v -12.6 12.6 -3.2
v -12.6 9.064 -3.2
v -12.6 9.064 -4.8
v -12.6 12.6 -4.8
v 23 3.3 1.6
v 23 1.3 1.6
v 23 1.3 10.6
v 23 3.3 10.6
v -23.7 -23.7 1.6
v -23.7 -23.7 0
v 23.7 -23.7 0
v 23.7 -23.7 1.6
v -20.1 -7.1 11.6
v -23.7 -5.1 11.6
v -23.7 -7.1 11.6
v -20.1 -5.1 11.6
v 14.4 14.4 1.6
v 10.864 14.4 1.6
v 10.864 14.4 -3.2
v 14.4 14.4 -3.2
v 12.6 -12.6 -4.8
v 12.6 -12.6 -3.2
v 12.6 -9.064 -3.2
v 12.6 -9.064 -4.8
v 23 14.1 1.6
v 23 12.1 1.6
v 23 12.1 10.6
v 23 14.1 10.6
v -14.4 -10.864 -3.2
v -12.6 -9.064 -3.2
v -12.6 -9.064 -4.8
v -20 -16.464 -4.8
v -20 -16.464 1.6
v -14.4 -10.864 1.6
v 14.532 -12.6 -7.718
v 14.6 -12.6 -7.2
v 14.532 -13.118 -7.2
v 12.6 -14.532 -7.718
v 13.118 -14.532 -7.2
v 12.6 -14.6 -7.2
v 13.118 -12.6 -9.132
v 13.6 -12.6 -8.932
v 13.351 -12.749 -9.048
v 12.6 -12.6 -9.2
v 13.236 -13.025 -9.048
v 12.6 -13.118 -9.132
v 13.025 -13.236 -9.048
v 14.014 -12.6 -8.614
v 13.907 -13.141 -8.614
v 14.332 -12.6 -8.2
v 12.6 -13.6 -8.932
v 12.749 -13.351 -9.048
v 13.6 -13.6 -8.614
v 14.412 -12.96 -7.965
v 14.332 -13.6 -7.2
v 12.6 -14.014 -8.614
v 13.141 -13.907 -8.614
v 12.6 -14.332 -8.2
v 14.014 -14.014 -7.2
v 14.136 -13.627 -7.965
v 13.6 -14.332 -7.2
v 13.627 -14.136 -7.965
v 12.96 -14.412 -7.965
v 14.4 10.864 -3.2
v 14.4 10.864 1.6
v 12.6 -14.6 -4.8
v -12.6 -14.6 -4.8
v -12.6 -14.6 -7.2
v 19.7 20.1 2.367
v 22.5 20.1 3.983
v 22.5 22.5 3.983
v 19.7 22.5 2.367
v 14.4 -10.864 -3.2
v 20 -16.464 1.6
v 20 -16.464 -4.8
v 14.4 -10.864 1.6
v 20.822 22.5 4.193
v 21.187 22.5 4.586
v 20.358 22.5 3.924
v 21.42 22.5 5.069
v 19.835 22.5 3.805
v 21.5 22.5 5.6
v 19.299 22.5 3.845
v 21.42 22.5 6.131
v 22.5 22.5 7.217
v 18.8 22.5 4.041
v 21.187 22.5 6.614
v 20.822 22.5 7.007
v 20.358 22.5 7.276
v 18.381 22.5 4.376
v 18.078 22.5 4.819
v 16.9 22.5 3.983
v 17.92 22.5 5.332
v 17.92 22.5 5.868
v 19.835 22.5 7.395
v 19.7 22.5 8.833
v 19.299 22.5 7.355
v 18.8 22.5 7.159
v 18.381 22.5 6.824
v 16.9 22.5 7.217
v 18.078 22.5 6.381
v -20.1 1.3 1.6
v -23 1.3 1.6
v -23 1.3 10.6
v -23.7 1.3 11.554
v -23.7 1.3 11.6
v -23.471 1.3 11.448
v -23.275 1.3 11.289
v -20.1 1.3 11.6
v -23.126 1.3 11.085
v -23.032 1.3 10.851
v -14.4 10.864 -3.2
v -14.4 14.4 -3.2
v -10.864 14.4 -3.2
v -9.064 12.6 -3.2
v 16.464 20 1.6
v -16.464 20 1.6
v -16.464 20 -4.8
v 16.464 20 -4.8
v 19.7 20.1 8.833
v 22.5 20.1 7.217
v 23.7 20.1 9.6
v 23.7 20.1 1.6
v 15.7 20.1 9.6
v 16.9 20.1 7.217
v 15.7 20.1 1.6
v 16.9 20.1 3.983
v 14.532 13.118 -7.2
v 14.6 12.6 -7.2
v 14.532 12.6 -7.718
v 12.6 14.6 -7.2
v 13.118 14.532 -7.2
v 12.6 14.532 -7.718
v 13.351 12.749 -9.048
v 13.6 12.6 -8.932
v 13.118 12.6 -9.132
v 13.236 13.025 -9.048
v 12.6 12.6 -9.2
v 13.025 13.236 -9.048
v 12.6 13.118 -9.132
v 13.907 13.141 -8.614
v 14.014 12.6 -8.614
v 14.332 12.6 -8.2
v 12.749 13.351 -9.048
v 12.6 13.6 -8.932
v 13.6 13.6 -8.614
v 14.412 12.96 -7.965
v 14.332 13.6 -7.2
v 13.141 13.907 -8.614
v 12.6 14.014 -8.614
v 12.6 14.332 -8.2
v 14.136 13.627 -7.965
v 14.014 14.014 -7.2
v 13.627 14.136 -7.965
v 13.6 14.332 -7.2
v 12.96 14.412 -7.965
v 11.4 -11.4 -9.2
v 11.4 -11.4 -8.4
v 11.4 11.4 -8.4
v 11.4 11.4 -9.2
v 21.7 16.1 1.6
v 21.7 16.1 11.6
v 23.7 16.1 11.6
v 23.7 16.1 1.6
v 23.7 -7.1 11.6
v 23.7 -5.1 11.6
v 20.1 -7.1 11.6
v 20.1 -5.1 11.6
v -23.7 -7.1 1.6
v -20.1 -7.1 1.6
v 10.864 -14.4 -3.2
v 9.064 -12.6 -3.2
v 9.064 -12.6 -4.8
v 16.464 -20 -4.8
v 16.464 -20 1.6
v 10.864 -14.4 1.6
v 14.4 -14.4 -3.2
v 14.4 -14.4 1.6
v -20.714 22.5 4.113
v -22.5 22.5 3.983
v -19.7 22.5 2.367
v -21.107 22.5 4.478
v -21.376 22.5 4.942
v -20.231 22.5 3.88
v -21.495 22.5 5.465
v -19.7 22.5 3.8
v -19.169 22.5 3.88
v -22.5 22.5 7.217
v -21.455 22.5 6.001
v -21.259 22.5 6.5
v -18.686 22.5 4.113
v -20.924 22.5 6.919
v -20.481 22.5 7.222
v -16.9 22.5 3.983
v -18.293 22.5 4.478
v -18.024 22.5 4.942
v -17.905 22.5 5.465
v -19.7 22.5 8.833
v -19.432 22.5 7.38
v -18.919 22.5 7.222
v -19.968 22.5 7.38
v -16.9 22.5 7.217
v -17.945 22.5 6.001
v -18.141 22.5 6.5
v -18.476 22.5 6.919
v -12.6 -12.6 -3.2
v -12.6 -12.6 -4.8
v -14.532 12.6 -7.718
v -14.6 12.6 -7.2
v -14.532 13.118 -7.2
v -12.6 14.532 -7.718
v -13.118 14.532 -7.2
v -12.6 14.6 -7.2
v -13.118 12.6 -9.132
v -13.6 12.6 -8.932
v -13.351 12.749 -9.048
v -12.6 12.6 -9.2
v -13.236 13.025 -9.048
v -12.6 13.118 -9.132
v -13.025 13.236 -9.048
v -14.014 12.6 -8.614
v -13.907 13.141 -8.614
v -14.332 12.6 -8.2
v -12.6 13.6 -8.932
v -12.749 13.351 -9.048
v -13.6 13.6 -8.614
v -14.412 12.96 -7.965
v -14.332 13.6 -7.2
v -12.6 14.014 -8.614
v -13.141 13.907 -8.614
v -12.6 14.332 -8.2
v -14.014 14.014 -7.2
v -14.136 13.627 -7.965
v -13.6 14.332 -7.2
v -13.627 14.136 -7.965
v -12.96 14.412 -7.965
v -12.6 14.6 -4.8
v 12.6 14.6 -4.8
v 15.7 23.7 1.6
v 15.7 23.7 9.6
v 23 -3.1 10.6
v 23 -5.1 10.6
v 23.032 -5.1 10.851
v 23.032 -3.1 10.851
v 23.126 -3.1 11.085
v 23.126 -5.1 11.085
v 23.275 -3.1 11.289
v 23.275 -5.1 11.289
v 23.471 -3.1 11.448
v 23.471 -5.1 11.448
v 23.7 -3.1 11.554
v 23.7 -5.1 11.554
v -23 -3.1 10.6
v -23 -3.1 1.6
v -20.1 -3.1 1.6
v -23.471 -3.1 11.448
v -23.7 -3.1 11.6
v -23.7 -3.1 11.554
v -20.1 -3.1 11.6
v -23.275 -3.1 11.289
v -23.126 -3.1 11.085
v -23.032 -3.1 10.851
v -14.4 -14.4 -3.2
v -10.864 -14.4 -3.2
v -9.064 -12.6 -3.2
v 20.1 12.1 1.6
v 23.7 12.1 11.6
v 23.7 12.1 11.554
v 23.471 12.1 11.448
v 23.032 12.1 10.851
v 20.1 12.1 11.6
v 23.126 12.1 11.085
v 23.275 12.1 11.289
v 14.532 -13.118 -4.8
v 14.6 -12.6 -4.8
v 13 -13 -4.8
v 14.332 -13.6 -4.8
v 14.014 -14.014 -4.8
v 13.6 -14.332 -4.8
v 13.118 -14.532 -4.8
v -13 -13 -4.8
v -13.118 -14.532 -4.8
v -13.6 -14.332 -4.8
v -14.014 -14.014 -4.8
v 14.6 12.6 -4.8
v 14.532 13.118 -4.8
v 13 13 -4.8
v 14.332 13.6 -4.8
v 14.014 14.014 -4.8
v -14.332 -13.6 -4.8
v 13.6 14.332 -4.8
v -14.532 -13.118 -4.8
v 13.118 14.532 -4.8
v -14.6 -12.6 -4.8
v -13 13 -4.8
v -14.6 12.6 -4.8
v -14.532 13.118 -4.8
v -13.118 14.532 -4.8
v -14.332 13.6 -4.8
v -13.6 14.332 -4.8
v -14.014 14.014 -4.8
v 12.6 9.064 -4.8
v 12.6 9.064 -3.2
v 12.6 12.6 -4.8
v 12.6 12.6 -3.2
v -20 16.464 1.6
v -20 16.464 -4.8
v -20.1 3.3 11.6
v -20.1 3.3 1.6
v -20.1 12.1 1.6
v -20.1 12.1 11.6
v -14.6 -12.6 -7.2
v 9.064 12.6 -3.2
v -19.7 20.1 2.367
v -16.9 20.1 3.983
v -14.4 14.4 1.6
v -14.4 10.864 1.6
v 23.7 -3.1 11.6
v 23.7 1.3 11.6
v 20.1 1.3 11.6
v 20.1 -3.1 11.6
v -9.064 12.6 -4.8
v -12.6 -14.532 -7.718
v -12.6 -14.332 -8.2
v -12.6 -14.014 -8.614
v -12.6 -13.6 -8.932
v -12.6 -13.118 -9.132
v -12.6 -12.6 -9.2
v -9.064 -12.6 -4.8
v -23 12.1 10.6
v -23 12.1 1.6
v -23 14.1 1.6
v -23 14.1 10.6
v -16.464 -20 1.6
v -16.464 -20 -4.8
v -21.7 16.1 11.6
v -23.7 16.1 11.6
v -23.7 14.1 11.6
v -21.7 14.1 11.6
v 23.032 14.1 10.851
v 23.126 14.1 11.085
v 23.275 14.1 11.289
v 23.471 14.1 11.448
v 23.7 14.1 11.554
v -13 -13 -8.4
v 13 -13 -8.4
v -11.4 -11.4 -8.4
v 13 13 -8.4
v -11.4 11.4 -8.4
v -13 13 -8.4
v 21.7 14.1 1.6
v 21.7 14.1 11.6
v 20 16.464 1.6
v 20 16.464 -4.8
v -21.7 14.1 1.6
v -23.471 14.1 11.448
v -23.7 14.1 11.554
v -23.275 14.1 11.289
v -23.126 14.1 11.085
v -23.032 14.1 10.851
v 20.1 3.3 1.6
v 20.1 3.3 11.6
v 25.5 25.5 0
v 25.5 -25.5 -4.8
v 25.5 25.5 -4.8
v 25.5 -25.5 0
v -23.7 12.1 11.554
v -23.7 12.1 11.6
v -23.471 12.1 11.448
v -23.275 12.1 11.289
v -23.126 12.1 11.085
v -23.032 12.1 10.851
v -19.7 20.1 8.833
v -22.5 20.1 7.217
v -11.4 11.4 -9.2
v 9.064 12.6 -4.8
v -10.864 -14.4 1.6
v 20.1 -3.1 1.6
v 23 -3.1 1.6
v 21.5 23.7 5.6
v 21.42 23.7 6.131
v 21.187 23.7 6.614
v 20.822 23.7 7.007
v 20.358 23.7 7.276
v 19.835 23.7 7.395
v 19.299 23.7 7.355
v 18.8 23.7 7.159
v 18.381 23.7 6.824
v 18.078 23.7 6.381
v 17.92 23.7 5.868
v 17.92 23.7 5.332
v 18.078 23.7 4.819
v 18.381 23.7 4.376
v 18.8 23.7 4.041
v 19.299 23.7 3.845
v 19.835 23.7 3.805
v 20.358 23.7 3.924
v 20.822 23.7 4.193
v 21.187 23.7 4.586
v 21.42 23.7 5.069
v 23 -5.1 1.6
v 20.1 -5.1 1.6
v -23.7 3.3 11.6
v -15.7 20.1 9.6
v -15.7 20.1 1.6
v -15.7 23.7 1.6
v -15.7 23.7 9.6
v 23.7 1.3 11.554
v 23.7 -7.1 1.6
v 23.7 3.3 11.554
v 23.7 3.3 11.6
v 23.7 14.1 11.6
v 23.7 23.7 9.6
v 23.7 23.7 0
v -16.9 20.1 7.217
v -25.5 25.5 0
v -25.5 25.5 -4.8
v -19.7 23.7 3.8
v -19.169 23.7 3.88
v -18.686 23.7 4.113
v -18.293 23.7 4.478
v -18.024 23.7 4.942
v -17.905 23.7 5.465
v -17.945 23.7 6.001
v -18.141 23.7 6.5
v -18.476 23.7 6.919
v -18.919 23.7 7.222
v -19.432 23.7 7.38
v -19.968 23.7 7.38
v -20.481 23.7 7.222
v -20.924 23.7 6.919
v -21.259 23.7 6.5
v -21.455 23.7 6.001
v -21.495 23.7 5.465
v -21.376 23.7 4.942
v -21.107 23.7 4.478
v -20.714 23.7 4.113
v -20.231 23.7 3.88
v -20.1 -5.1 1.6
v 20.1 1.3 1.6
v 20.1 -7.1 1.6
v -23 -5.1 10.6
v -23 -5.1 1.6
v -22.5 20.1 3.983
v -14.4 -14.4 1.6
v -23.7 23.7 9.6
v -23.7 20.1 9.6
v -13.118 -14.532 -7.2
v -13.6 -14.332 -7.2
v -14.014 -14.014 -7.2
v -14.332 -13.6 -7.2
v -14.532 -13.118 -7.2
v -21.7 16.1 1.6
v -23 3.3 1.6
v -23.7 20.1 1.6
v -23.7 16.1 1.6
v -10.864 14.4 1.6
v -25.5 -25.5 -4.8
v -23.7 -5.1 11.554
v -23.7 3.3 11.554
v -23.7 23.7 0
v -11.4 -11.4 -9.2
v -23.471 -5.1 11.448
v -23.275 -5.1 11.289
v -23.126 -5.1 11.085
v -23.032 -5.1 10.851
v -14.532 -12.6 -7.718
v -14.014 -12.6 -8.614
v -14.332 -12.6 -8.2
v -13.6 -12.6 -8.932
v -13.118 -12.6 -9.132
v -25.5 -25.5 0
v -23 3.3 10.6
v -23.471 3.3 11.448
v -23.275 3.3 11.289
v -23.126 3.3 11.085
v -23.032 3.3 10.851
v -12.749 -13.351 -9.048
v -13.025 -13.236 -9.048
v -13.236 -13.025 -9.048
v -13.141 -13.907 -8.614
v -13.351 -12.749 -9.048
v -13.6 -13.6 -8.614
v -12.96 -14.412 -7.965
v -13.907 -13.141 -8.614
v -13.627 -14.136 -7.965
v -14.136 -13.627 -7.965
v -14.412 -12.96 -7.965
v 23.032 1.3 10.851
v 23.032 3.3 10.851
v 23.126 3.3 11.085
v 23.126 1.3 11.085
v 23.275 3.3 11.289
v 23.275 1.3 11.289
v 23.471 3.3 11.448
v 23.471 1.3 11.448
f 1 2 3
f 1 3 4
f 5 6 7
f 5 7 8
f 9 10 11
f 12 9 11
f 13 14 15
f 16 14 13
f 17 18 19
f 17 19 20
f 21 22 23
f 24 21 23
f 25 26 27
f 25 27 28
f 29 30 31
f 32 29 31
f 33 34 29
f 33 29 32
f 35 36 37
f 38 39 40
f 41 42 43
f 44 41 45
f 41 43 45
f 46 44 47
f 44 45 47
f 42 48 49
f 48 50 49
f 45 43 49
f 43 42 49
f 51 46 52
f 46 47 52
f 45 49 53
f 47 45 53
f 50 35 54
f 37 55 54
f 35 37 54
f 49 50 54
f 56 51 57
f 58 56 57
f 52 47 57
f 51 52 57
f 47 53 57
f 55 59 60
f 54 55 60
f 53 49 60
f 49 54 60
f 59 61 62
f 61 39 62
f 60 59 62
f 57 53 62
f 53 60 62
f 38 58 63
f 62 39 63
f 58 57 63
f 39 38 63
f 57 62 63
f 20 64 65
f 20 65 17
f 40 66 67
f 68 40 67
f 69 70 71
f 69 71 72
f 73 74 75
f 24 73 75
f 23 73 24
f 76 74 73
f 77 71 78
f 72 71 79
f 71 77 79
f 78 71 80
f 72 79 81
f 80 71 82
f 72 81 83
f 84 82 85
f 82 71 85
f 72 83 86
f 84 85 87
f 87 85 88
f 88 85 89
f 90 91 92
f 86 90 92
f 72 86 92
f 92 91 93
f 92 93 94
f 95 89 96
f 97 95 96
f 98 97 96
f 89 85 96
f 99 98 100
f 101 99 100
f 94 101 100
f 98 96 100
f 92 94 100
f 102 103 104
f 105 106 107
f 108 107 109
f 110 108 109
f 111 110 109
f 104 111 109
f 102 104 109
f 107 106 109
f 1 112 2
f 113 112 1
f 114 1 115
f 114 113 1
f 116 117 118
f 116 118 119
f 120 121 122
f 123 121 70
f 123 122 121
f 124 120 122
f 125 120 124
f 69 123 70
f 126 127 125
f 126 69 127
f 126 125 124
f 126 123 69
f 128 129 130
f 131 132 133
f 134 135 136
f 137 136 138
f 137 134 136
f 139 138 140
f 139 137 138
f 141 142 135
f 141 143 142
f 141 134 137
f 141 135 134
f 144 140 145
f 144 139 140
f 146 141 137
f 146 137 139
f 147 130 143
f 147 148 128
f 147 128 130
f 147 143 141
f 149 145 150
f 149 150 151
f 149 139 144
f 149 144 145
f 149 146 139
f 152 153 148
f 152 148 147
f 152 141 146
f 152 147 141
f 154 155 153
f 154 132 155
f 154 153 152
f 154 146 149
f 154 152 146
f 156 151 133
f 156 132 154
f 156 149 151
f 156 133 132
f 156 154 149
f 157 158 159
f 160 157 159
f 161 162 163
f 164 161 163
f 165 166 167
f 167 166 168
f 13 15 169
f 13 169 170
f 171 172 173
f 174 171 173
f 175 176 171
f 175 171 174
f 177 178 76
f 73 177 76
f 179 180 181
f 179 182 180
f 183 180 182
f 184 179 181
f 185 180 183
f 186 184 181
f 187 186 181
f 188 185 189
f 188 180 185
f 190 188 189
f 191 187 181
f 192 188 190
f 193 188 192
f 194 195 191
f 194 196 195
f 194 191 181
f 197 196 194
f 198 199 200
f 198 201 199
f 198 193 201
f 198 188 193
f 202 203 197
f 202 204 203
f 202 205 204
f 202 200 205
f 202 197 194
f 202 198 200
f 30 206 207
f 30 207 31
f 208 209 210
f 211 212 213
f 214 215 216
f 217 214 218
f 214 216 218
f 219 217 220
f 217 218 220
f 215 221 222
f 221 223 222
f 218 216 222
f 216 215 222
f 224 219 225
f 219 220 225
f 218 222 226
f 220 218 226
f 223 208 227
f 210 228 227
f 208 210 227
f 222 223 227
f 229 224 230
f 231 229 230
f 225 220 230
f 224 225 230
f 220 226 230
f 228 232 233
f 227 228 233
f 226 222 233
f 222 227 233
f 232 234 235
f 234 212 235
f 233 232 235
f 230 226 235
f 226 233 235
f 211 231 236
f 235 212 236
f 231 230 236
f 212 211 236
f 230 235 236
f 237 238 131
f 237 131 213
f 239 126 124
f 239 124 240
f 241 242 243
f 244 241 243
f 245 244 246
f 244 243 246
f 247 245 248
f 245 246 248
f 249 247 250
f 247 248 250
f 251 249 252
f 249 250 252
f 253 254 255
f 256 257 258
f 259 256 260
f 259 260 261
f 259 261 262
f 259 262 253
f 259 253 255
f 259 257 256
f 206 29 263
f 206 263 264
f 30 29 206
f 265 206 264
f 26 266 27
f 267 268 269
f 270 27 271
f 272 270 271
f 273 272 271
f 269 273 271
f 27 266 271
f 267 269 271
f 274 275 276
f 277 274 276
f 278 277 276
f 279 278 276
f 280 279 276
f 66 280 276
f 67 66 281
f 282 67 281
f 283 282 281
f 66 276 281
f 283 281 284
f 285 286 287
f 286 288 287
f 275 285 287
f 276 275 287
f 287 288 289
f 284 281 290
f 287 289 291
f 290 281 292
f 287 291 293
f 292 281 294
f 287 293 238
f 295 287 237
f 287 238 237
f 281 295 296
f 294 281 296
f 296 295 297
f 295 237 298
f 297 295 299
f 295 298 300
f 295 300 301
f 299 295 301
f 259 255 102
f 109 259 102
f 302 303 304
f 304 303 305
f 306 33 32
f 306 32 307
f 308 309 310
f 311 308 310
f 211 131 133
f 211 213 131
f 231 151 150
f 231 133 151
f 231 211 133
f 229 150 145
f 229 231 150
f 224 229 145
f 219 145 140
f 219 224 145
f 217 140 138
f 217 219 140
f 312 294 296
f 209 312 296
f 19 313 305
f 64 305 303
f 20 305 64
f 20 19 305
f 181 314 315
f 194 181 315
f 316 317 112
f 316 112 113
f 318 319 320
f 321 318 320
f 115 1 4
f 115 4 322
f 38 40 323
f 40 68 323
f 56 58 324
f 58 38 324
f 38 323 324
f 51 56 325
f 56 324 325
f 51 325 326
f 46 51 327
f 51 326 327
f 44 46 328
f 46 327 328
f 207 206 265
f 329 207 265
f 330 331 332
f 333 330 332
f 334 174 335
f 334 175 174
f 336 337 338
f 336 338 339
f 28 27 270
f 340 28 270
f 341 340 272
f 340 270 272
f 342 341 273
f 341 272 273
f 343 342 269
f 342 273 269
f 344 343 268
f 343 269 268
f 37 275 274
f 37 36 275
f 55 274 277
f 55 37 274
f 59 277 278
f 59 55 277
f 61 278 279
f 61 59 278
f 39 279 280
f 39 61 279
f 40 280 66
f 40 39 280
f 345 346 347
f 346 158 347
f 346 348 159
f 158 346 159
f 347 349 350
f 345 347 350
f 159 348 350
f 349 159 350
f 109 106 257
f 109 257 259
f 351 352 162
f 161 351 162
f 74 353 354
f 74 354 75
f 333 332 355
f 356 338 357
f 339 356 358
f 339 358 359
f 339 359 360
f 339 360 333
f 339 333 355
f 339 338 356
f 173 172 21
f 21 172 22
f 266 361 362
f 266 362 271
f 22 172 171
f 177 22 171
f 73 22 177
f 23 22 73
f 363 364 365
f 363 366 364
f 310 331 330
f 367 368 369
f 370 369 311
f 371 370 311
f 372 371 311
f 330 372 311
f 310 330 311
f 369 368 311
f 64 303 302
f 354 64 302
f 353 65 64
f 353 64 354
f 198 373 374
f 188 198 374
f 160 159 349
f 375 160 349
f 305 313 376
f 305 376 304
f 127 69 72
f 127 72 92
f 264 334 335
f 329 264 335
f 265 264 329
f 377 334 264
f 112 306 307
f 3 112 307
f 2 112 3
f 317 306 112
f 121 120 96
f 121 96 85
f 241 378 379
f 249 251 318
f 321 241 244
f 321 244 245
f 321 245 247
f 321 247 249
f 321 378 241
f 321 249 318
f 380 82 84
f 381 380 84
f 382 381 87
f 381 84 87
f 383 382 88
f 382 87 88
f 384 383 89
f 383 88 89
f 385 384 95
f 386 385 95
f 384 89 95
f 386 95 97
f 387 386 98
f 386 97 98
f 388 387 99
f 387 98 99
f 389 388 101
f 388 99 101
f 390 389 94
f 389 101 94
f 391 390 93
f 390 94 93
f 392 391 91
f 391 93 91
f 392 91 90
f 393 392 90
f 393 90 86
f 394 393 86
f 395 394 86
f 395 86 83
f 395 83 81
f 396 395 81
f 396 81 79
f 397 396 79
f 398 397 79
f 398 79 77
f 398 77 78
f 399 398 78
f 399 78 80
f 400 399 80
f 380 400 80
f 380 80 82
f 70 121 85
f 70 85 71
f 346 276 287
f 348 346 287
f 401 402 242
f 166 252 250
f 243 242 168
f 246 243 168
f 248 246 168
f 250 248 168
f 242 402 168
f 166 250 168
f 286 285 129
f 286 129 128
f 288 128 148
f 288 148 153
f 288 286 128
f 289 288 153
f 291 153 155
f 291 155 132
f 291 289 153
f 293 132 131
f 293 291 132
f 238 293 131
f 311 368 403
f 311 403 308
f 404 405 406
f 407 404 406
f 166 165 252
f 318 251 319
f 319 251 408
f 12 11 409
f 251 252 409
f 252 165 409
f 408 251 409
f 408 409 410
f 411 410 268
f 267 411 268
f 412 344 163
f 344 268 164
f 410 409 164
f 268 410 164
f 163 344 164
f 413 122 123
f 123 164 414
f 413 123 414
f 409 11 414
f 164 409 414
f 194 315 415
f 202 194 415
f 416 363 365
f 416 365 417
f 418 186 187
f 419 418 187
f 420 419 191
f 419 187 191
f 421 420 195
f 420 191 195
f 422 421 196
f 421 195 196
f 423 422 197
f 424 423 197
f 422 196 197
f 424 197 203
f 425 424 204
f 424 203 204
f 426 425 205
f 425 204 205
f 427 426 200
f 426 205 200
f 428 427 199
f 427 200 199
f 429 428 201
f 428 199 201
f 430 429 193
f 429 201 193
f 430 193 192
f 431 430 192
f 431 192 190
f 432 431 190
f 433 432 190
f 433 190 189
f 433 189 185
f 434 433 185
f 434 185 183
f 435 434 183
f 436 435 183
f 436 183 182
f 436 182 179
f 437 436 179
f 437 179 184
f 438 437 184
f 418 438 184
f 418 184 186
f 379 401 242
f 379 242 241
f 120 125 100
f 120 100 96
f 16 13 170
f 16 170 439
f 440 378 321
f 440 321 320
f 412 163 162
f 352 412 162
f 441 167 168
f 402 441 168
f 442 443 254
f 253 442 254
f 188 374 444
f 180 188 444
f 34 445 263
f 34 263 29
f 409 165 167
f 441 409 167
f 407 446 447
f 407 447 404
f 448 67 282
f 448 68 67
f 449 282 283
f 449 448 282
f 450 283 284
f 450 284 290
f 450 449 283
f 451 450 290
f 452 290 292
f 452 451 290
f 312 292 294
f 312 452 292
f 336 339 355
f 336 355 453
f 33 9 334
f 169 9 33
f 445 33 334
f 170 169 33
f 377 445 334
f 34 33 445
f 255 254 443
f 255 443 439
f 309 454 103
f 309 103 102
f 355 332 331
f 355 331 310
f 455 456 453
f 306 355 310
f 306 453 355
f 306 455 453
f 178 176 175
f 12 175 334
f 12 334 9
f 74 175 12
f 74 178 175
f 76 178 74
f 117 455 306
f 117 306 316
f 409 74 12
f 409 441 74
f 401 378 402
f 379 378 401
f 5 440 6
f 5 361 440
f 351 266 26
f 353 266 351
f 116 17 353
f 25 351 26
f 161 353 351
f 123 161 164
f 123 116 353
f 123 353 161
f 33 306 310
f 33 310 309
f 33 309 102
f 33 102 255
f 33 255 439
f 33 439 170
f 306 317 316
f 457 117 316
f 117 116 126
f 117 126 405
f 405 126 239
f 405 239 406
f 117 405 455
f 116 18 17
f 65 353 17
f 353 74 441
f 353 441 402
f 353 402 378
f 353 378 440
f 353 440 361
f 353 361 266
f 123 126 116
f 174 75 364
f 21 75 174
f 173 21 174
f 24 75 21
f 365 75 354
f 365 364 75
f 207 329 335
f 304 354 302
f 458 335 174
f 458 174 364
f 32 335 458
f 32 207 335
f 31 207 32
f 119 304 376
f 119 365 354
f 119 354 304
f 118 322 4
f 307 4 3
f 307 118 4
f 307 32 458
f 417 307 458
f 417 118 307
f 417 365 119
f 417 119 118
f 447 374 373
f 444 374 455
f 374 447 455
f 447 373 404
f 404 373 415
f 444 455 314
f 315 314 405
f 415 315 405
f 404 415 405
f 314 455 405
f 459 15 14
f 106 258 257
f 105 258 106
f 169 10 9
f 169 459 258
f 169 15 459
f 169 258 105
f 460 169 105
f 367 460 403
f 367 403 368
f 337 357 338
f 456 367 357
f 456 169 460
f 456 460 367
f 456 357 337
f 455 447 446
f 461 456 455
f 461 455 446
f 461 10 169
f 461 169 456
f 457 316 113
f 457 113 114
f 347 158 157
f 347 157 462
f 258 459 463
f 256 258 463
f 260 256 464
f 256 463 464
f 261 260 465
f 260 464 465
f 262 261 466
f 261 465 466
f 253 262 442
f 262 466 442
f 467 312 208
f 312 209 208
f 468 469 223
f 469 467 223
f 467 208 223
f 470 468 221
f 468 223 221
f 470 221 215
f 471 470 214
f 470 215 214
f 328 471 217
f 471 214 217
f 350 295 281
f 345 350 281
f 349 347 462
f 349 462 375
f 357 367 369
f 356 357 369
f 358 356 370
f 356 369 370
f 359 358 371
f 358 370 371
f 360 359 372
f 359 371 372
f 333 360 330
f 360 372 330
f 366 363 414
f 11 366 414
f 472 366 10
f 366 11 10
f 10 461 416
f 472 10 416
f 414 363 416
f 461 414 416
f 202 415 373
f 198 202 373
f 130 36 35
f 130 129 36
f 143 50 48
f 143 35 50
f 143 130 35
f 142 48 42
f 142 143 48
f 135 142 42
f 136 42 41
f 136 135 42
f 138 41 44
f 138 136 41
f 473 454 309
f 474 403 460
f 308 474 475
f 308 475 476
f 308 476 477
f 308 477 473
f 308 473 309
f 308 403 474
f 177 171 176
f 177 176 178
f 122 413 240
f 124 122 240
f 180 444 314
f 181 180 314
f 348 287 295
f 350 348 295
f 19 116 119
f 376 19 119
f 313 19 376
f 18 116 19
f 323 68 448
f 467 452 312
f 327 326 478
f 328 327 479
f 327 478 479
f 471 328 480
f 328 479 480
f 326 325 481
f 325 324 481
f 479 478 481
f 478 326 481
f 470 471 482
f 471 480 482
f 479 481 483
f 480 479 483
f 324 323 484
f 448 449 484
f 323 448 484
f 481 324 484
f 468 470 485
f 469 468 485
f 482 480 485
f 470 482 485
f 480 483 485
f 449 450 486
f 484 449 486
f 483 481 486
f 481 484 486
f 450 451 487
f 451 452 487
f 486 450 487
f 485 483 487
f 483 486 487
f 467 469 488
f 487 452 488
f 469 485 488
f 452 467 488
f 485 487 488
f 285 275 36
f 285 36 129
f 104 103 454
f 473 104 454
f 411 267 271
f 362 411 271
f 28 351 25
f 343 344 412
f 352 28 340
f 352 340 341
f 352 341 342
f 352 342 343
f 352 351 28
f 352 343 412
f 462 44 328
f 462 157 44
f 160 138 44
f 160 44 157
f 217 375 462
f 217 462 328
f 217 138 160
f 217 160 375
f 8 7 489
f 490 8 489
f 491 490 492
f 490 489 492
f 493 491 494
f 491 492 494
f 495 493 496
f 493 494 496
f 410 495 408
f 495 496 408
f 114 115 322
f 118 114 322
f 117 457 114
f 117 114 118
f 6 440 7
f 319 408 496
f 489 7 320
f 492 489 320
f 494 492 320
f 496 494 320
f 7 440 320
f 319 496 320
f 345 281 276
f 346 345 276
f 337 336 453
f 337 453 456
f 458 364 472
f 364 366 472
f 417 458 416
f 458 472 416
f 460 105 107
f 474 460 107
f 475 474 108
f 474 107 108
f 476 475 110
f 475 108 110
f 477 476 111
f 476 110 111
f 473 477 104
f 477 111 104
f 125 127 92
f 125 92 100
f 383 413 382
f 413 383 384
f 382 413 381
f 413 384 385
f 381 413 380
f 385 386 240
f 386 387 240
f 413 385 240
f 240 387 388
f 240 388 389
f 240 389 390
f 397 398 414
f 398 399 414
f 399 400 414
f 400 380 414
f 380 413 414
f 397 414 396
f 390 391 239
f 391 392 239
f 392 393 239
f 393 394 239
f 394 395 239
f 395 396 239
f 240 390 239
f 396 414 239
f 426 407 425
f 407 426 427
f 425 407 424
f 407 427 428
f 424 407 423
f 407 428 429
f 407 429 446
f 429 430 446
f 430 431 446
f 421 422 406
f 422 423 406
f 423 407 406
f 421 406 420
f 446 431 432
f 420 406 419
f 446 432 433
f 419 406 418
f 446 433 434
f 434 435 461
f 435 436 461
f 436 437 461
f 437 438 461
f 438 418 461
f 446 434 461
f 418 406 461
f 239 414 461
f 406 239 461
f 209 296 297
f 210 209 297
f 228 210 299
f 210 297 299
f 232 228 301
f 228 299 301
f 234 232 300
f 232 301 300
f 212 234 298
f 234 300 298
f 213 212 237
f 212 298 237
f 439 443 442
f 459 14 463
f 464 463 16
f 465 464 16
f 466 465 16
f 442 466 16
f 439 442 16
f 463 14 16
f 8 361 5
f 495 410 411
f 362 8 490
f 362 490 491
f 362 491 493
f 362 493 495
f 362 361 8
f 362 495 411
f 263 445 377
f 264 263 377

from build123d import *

# Parameters (mm, degrees)
ESBO_O3_W                = 47.4
ESBO_O3_H                = 47.4
RESSALTO_EXTRUS_O2_DEPTH = 1.6
ESBO_O5_W                = 51
ESBO_O5_H                = 51
RESSALTO_EXTRUS_O3_DEPTH = 1.6
CORTE_EXTRUS_O1_DEPTH    = 3.2
RESSALTO_EXTRUS_O4_DEPTH = 10
FILETE1_R                = 1
ESBO_O10_W               = 51
ESBO_O10_H               = 51
RESSALTO_EXTRUS_O5_DEPTH = 3.2
ESBO_O11_W               = 28.8
ESBO_O11_H               = 28.8
CORTE_EXTRUS_O2_DEPTH    = 4.8
ESBO_O14_W               = 25.2
ESBO_O14_H               = 25.2
CORTE_EXTRUS_O4_DEPTH    = 39.981277557
ESBO_O7_3_W              = 8
ESBO_O7_3_H              = 3.6
RESSALTO_EXTRUS_O7_DEPTH = 8
ESBO_O18_R               = 1.8
CORTE_EXTRUS_O8_DEPTH    = 2.4
ESBO_O18_3_R             = 1.8
CORTE_EXTRUS_O9_DEPTH    = 54.517940917
RESSALTO_EXTRUS_O8_DEPTH = 3.6
ESBO_O20_W               = 29.2
ESBO_O20_H               = 29.2
ESBO_O20_W_2             = 22.8
ESBO_O20_H_2             = 22.8
RESSALTO_EXTRUS_O9_DEPTH = 0.8
FILETE2_R                = 2


with BuildPart() as part:
    # Esboço3 → Ressalto-extrusão2 (new body)
    with BuildSketch(Plane.XY):
        Rectangle(ESBO_O3_W, ESBO_O3_H)
    extrude(amount=RESSALTO_EXTRUS_O2_DEPTH)

    # Esboço5 → Ressalto-extrusão3 (add)
    with BuildSketch(Plane(origin=(0, 0, 0), x_dir=(-1, 0, 0), z_dir=(0, 0, -1))):
        Rectangle(ESBO_O5_W, ESBO_O5_H)
    extrude(amount=RESSALTO_EXTRUS_O3_DEPTH)

    # Esboço6 → Corte-extrusão1 (cut)
    with BuildSketch(Plane(origin=(0, 0, -1.6), x_dir=(-1, 0, 0), z_dir=(0, 0, -1))):
        Polygon((3.535533906, 0), (20, 16.464466094), (20, -16.464466094), align=None)
        Polygon((-16.464466094, -20), (0, -3.535533906), (16.464466094, -20), align=None)
        Polygon((-20, 16.464466094), (-3.535533906, 0), (-20, -16.464466094), align=None)
        Polygon((-16.464466094, 20), (0, 3.535533906), (16.464466094, 20), align=None)
    extrude(amount=-CORTE_EXTRUS_O1_DEPTH, mode=Mode.SUBTRACT)

    # Esboço7 → Ressalto-extrusão4 (add)
    with BuildSketch(Plane.XY.offset(1.6)):
        Polygon((-21.7, 16.1), (-23.7, 16.1), (-23.7, -7.1), (-20.1, -7.1), (-20.1, -5.1), (-23, -5.1), (-23, -3.1), (-20.1, -3.1), (-20.1, 1.3), (-23, 1.3), (-23, 3.3), (-20.1, 3.3), (-20.1, 12.1), (-23, 12.1), (-23, 14.1), (-21.7, 14.1), align=None)
    ressalto_extrus_o4 = extrude(amount=RESSALTO_EXTRUS_O4_DEPTH)

    # Espelhar1: Ressalto-extrusão4 across plane
    add(ressalto_extrus_o4.mirror(Plane(origin=(0, 0, 0), x_dir=(0, 0, 1), z_dir=(1, 0, 0))))

    # Filete1
    # the kernel refuses this fillet: 1 mm, written as the material it takes off along each edge
    with BuildSketch(Plane(origin=(23, 12.1, 11.6), x_dir=(0, 0, -1), z_dir=(0, 1, 0)), Plane(origin=(23, 1.3, 11.6), x_dir=(0, 0, -1), z_dir=(0, 1, 0)), Plane(origin=(23, -5.1, 11.6), x_dir=(0, 0, -1), z_dir=(0, 1, 0)), Plane(origin=(-23, -5.1, 11.6), x_dir=(-1, 0, 0), z_dir=(0, 1, 0)), Plane(origin=(-23, 1.3, 11.6), x_dir=(-1, 0, 0), z_dir=(0, 1, 0)), Plane(origin=(-23, 12.1, 11.6), x_dir=(-1, 0, 0), z_dir=(0, 1, 0))) as filete1_piece_1:
        with BuildLine():
            CenterArc((FILETE1_R, -FILETE1_R), FILETE1_R, 90, 90)
            Line((0, -FILETE1_R), (0, 0))
            Line((0, 0), (FILETE1_R, 0))
        make_face()
    extrude(amount=2, mode=Mode.SUBTRACT)

    # Esboço10 → Ressalto-extrusão5 (add)
    with BuildSketch(Plane(origin=(0, 0, -1.6), x_dir=(-1, 0, 0), z_dir=(0, 0, -1))):
        Rectangle(ESBO_O10_W, ESBO_O10_H)
        Polygon((-16.464466094, -20), (16.464466094, -20), (0, -3.535533906), align=None, mode=Mode.SUBTRACT)
        Polygon((3.535533906, 0), (20, -16.464466094), (20, 16.464466094), align=None, mode=Mode.SUBTRACT)
        Polygon((0, 3.535533906), (16.464466094, 20), (-16.464466094, 20), align=None, mode=Mode.SUBTRACT)
        Polygon((-3.535533906, 0), (-20, 16.464466094), (-20, -16.464466094), align=None, mode=Mode.SUBTRACT)
    extrude(amount=RESSALTO_EXTRUS_O5_DEPTH)

    # Esboço11 → Corte-extrusão2 (cut)
    with BuildSketch(Plane.XY.offset(1.6)):
        Rectangle(ESBO_O11_W, ESBO_O11_H)
    extrude(amount=-CORTE_EXTRUS_O2_DEPTH, mode=Mode.SUBTRACT)

    # Esboço14 → Corte-extrusão4 (cut, through all)
    with BuildSketch(Plane.XY.offset(-3.2)):
        Rectangle(ESBO_O14_W, ESBO_O14_H)
    extrude(amount=-CORTE_EXTRUS_O4_DEPTH, mode=Mode.SUBTRACT)

    # Esboço7<3> → Ressalto-extrusão7 (add)
    with BuildSketch(Plane.XY.offset(1.6)):
        with Locations((-19.7, 21.9)):
            Rectangle(ESBO_O7_3_W, ESBO_O7_3_H)
    ressalto_extrus_o7 = extrude(amount=RESSALTO_EXTRUS_O7_DEPTH)

    # Espelhar2: Ressalto-extrusão7 across plane
    add(ressalto_extrus_o7.mirror(Plane(origin=(0, 0, 0), x_dir=(0, 0, 1), z_dir=(1, 0, 0))))

    # Esboço18 → Corte-extrusão8 (cut)
    # profile 1 of 2: a face of its own
    with BuildSketch(Plane.XZ.offset(-20.1)):
        Polygon((-16.9, 3.983419246), (-16.9, 7.216580754), (-19.7, 8.833161507), (-22.5, 7.216580754), (-22.5, 3.983419246), (-19.7, 2.366838493), align=None)
        with Locations(Location((-19.7, 5.6, 0), (0, 0, 270))):
            Circle(ESBO_O18_R, mode=Mode.SUBTRACT)
    # profile 2 of 2: a face of its own
    with BuildSketch(Plane.XZ.offset(-20.1)):
        Polygon((16.9, 7.216580754), (19.7, 8.833161507), (22.5, 7.216580754), (22.5, 3.983419246), (19.7, 2.366838493), (16.9, 3.983419246), align=None)
    extrude(amount=-CORTE_EXTRUS_O8_DEPTH, mode=Mode.SUBTRACT)

    # Esboço18<3> → Corte-extrusão9 (cut, through all)
    with BuildSketch(Plane.XZ.offset(-20.1)):
        with Locations((19.7, 5.6)):
            Circle(ESBO_O18_3_R)
        with Locations(Location((-19.7, 5.6, 0), (0, 0, 270))):
            Circle(ESBO_O18_3_R)
    extrude(amount=-CORTE_EXTRUS_O9_DEPTH, mode=Mode.SUBTRACT)


with BuildPart() as body_2:
    # Esboço19 → Ressalto-extrusão8 (new body)
    with BuildSketch(Plane(origin=(0, 0, -4.8), x_dir=(-1, 0, 0), z_dir=(0, 0, -1))):
        Polygon((-13, 9.464466094), (-13, 13), (-9.464466094, 13), (-11.064466094, 14.6), (-14.6, 14.6), (-14.6, 11.064466094), align=None)
        Polygon((-13, -9.464466094), (-13, 9.464466094), (-14.6, 11.064466094), (-14.6, -11.064466094), align=None)
        Polygon((-11.064466094, 14.6), (-9.464466094, 13), (9.464466094, 13), (11.064466094, 14.6), align=None)
        Polygon((11.064466094, 14.6), (9.464466094, 13), (13, 13), (13, 9.464466094), (14.6, 11.064466094), (14.6, 14.6), align=None)
        Polygon((14.6, 11.064466094), (13, 9.464466094), (13, -9.464466094), (14.6, -11.064466094), align=None)
        Polygon((13, -13), (9.464466094, -13), (11.064466094, -14.6), (14.6, -14.6), (14.6, -11.064466094), (13, -9.464466094), align=None)
        Polygon((9.464466094, -13), (-9.464466094, -13), (-11.064466094, -14.6), (11.064466094, -14.6), align=None)
        Polygon((-13, -13), (-13, -9.464466094), (-14.6, -11.064466094), (-14.6, -14.6), (-11.064466094, -14.6), (-9.464466094, -13), align=None)
    extrude(amount=RESSALTO_EXTRUS_O8_DEPTH)

    # Esboço20 → Ressalto-extrusão9 (add)
    with BuildSketch(Plane(origin=(0, 0, -8.4), x_dir=(-1, 0, 0), z_dir=(0, 0, -1))):
        Rectangle(ESBO_O20_W, ESBO_O20_H)
        Rectangle(ESBO_O20_W_2, ESBO_O20_H_2, mode=Mode.SUBTRACT)
    extrude(amount=RESSALTO_EXTRUS_O9_DEPTH)

    # Filete2
    filete2_edges = [body_2.edges().sort_by_distance(p)[0] for p in [
        (14.6, -14.6, -7),
        (14.6, 14.6, -7),
        (-14.6, 14.6, -7),
        (-14.6, -14.6, -7),
        (14.6, 0, -9.2),
        (0, -14.6, -9.2),
        (-14.6, 0, -9.2),
        (0, 14.6, -9.2),
    ]]
    fillet(filete2_edges, radius=FILETE2_R)


solid = Compound([part.part, body_2.part])
